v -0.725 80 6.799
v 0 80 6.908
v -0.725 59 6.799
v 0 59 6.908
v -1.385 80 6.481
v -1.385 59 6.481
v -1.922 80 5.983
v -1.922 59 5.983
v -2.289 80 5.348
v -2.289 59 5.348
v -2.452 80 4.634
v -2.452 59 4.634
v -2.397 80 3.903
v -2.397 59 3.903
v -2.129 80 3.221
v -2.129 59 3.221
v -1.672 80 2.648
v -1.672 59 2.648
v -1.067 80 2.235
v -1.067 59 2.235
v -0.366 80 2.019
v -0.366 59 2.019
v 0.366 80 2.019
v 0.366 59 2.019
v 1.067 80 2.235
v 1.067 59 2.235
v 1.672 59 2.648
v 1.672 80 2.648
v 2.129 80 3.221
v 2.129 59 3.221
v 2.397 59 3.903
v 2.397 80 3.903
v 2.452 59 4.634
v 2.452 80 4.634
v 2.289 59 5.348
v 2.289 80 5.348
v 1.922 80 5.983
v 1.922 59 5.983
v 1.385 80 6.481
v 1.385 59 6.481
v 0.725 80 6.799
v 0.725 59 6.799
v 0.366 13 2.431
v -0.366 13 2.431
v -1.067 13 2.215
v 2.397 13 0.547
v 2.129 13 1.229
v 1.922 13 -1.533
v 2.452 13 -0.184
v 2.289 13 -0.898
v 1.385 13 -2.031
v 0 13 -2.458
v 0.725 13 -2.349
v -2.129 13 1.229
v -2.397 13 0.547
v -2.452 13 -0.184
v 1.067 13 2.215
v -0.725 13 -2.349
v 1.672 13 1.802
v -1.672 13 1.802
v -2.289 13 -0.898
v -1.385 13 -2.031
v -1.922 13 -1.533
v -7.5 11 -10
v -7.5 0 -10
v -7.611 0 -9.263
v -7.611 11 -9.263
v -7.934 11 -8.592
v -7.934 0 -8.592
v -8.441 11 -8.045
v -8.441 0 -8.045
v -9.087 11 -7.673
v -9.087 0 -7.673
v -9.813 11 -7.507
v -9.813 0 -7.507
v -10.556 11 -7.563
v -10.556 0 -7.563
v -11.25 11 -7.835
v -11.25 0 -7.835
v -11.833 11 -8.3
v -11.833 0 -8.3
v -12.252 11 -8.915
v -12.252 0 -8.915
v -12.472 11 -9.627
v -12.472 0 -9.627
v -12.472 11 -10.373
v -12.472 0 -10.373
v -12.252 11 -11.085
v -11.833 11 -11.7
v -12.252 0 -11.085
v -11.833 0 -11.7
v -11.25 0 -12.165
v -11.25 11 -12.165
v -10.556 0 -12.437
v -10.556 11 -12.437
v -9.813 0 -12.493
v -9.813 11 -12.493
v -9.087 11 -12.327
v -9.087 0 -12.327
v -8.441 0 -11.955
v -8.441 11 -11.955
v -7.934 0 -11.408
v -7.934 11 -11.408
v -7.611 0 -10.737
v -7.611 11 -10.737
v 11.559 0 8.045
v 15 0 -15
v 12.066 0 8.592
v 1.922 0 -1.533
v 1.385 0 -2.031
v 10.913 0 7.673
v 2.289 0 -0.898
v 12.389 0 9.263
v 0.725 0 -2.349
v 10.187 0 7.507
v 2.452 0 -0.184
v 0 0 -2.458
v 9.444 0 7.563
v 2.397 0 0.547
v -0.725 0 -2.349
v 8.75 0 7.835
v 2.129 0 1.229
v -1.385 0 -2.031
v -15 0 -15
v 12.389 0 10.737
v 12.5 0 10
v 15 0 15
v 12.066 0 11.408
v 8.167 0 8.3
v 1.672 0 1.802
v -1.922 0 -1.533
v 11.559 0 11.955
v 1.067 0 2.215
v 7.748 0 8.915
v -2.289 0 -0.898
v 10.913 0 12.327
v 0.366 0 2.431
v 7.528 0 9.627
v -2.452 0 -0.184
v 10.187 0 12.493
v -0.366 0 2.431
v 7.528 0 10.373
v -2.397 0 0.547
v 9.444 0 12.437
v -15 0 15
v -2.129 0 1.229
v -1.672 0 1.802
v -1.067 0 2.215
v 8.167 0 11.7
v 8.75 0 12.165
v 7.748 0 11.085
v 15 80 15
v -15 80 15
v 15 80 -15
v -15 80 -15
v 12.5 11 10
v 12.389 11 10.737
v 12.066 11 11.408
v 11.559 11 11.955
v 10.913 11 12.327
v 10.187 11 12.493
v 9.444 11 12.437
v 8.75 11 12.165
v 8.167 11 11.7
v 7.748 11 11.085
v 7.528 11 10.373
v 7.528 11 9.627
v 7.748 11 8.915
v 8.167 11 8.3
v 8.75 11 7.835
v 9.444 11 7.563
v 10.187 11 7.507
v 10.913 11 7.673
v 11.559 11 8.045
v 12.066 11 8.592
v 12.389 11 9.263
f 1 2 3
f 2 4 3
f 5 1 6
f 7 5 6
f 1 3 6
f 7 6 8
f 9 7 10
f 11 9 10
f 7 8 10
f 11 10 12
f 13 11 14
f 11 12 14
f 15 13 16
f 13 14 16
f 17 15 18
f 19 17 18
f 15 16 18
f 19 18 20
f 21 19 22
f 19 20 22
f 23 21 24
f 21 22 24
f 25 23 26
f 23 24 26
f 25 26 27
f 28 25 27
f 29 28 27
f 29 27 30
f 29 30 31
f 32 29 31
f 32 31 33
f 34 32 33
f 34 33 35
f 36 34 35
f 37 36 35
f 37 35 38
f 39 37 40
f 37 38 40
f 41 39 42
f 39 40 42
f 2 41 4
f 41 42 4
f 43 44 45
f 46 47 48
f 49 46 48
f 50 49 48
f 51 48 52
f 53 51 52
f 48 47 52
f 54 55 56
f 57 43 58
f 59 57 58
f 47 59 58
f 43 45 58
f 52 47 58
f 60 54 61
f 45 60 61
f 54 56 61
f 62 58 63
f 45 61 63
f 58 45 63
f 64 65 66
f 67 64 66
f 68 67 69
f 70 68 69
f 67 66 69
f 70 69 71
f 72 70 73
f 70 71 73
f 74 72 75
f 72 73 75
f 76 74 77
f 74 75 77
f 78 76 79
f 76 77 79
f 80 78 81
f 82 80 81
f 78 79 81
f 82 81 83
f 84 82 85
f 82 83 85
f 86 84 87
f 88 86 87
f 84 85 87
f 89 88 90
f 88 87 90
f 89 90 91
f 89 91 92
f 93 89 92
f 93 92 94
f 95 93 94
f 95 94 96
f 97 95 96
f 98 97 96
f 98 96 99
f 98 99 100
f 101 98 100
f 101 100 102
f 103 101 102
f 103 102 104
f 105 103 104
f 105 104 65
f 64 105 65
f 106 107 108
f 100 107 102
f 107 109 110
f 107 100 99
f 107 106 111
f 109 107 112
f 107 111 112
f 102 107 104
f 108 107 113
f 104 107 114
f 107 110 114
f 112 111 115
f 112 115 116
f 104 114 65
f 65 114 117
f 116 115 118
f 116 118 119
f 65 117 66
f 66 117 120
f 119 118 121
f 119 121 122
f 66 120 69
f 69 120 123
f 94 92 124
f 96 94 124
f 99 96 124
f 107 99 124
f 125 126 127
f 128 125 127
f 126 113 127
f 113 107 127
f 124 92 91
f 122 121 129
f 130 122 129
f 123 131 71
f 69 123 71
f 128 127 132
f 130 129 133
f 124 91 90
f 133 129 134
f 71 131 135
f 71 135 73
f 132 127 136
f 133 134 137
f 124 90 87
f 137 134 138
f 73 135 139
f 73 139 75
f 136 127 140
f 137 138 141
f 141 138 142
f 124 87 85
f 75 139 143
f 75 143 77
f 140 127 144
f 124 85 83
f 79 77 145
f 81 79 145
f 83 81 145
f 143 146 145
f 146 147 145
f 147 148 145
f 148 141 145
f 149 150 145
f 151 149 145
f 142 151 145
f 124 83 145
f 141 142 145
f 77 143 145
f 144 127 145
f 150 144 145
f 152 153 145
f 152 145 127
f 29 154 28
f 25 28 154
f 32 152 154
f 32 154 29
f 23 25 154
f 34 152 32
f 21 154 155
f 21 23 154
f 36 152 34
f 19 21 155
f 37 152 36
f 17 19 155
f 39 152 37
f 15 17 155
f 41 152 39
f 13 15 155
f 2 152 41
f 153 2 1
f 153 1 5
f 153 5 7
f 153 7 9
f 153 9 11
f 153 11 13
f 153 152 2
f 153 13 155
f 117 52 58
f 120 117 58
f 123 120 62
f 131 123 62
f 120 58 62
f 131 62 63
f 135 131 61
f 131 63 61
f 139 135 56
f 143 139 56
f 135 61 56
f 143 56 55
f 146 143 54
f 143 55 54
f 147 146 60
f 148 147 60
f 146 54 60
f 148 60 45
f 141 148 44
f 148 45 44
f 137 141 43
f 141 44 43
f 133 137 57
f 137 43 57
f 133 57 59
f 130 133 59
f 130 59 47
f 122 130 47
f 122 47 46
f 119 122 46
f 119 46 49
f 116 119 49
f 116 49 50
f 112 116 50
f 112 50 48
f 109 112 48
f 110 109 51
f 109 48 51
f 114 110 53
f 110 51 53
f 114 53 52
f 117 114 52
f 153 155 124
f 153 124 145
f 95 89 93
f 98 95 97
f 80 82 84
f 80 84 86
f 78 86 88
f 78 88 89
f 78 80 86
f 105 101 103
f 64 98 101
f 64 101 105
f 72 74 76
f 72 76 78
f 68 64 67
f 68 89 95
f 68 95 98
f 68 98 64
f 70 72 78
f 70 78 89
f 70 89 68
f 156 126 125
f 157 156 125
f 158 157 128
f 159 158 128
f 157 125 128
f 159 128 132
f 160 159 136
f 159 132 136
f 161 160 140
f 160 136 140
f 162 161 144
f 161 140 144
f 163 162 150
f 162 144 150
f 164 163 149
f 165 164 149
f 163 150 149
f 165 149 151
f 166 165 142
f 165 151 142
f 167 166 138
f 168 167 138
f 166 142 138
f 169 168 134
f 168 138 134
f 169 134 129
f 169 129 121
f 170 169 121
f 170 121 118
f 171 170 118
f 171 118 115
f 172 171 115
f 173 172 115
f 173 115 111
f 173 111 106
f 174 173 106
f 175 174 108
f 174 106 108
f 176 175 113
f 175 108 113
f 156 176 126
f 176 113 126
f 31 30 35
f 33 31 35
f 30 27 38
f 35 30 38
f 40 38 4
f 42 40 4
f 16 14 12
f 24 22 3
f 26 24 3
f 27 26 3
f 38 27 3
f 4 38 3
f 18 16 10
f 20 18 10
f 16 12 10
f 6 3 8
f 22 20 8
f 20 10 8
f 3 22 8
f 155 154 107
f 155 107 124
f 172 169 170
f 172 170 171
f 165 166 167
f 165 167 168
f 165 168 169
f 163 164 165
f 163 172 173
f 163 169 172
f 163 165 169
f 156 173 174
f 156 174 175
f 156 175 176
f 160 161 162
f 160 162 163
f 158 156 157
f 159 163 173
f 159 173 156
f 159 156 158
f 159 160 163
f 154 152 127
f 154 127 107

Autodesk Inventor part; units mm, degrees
ref_plane "YZ Plane" through (0, 0, 0) normal (1, 0, 0) x (0, 1, 0)
ref_plane "XZ Plane" through (0, 0, 0) normal (0, 1, 0) x (-1, 0, 0)
ref_plane "XY Plane" through (0, 0, 0) normal (0, 0, 1) x (1, 0, 0)
sketch "Sketch1" plane through (0, 0, 0) normal (0, 1, 0) x (-1, 0, 0)
  line L0 (15, 15) -> (-15, 15)
  line L1 (-15, 15) -> (-15, -15)
  line L2 (-15, -15) -> (15, -15)
  line L3 (15, -15) -> (15, 15)
  line L4 (15, 15) -> (-15, -15) construction
  line L5 (-15, 15) -> (15, -15) construction
  point P0 (0, 0)
  dimension "d0" = 30
  dimension "d1" = 30
extrude "Extrusion1" add sketch "Sketch1" along normal blind 80
sketch "Sketch2" plane through (0, 80, 0) normal (0, 1, 0) x (1, 0, 0)
  line L0 (-15, -15) -> (15, -15) construction
  line L1 (0, -15) -> (0, 3.55) construction
  line L2 (0, 3.55) -> (0, -4.45) construction
  point P0 (0, 0)
  dimension "d4" = 18.55
  dimension "d5" = 8
hole "Hole1" at (0, 80, 4.45) direction (0, -1, 0) diameter 4.917 depth 21 thread size "M6x1" class "6H" standard "ISO Metric profile"
sketch "Sketch3" plane through (0, 0, 0) normal (0, -1, 0) x (1, 0, 0)
  line L0 (-10, -10) -> (10, -10) construction
  line L1 (10, -10) -> (10, 10) construction
  line L2 (10, 10) -> (-10, 10) construction
  line L3 (-10, 10) -> (-10, -10) construction
  line L4 (-10, -10) -> (10, 10) construction
  line L5 (10, -10) -> (-10, 10) construction
  circle A0 centre (10, 10) radius 2.5
  circle A1 centre (-10, -10) radius 2.5
  point P0 (0, 0)
  dimension "d20" = 20
  dimension "d21" = 20
  dimension "d22" = 5
  dimension "d23" = 5
hole "Hole2" at (0, 0, 0) direction (0, 1, 0) diameter 4.917 depth 13 thread size "M6x1" class "6H" standard "ISO Metric profile"
extrude "Extrusion2" cut sketch "Sketch3" against normal blind 11
sketch "Sketch7" plane through (0, 0, 0) normal (0, -1, 0) x (1, 0, 0)
  point P0 (0, 0)
properties part number "TallTower"
